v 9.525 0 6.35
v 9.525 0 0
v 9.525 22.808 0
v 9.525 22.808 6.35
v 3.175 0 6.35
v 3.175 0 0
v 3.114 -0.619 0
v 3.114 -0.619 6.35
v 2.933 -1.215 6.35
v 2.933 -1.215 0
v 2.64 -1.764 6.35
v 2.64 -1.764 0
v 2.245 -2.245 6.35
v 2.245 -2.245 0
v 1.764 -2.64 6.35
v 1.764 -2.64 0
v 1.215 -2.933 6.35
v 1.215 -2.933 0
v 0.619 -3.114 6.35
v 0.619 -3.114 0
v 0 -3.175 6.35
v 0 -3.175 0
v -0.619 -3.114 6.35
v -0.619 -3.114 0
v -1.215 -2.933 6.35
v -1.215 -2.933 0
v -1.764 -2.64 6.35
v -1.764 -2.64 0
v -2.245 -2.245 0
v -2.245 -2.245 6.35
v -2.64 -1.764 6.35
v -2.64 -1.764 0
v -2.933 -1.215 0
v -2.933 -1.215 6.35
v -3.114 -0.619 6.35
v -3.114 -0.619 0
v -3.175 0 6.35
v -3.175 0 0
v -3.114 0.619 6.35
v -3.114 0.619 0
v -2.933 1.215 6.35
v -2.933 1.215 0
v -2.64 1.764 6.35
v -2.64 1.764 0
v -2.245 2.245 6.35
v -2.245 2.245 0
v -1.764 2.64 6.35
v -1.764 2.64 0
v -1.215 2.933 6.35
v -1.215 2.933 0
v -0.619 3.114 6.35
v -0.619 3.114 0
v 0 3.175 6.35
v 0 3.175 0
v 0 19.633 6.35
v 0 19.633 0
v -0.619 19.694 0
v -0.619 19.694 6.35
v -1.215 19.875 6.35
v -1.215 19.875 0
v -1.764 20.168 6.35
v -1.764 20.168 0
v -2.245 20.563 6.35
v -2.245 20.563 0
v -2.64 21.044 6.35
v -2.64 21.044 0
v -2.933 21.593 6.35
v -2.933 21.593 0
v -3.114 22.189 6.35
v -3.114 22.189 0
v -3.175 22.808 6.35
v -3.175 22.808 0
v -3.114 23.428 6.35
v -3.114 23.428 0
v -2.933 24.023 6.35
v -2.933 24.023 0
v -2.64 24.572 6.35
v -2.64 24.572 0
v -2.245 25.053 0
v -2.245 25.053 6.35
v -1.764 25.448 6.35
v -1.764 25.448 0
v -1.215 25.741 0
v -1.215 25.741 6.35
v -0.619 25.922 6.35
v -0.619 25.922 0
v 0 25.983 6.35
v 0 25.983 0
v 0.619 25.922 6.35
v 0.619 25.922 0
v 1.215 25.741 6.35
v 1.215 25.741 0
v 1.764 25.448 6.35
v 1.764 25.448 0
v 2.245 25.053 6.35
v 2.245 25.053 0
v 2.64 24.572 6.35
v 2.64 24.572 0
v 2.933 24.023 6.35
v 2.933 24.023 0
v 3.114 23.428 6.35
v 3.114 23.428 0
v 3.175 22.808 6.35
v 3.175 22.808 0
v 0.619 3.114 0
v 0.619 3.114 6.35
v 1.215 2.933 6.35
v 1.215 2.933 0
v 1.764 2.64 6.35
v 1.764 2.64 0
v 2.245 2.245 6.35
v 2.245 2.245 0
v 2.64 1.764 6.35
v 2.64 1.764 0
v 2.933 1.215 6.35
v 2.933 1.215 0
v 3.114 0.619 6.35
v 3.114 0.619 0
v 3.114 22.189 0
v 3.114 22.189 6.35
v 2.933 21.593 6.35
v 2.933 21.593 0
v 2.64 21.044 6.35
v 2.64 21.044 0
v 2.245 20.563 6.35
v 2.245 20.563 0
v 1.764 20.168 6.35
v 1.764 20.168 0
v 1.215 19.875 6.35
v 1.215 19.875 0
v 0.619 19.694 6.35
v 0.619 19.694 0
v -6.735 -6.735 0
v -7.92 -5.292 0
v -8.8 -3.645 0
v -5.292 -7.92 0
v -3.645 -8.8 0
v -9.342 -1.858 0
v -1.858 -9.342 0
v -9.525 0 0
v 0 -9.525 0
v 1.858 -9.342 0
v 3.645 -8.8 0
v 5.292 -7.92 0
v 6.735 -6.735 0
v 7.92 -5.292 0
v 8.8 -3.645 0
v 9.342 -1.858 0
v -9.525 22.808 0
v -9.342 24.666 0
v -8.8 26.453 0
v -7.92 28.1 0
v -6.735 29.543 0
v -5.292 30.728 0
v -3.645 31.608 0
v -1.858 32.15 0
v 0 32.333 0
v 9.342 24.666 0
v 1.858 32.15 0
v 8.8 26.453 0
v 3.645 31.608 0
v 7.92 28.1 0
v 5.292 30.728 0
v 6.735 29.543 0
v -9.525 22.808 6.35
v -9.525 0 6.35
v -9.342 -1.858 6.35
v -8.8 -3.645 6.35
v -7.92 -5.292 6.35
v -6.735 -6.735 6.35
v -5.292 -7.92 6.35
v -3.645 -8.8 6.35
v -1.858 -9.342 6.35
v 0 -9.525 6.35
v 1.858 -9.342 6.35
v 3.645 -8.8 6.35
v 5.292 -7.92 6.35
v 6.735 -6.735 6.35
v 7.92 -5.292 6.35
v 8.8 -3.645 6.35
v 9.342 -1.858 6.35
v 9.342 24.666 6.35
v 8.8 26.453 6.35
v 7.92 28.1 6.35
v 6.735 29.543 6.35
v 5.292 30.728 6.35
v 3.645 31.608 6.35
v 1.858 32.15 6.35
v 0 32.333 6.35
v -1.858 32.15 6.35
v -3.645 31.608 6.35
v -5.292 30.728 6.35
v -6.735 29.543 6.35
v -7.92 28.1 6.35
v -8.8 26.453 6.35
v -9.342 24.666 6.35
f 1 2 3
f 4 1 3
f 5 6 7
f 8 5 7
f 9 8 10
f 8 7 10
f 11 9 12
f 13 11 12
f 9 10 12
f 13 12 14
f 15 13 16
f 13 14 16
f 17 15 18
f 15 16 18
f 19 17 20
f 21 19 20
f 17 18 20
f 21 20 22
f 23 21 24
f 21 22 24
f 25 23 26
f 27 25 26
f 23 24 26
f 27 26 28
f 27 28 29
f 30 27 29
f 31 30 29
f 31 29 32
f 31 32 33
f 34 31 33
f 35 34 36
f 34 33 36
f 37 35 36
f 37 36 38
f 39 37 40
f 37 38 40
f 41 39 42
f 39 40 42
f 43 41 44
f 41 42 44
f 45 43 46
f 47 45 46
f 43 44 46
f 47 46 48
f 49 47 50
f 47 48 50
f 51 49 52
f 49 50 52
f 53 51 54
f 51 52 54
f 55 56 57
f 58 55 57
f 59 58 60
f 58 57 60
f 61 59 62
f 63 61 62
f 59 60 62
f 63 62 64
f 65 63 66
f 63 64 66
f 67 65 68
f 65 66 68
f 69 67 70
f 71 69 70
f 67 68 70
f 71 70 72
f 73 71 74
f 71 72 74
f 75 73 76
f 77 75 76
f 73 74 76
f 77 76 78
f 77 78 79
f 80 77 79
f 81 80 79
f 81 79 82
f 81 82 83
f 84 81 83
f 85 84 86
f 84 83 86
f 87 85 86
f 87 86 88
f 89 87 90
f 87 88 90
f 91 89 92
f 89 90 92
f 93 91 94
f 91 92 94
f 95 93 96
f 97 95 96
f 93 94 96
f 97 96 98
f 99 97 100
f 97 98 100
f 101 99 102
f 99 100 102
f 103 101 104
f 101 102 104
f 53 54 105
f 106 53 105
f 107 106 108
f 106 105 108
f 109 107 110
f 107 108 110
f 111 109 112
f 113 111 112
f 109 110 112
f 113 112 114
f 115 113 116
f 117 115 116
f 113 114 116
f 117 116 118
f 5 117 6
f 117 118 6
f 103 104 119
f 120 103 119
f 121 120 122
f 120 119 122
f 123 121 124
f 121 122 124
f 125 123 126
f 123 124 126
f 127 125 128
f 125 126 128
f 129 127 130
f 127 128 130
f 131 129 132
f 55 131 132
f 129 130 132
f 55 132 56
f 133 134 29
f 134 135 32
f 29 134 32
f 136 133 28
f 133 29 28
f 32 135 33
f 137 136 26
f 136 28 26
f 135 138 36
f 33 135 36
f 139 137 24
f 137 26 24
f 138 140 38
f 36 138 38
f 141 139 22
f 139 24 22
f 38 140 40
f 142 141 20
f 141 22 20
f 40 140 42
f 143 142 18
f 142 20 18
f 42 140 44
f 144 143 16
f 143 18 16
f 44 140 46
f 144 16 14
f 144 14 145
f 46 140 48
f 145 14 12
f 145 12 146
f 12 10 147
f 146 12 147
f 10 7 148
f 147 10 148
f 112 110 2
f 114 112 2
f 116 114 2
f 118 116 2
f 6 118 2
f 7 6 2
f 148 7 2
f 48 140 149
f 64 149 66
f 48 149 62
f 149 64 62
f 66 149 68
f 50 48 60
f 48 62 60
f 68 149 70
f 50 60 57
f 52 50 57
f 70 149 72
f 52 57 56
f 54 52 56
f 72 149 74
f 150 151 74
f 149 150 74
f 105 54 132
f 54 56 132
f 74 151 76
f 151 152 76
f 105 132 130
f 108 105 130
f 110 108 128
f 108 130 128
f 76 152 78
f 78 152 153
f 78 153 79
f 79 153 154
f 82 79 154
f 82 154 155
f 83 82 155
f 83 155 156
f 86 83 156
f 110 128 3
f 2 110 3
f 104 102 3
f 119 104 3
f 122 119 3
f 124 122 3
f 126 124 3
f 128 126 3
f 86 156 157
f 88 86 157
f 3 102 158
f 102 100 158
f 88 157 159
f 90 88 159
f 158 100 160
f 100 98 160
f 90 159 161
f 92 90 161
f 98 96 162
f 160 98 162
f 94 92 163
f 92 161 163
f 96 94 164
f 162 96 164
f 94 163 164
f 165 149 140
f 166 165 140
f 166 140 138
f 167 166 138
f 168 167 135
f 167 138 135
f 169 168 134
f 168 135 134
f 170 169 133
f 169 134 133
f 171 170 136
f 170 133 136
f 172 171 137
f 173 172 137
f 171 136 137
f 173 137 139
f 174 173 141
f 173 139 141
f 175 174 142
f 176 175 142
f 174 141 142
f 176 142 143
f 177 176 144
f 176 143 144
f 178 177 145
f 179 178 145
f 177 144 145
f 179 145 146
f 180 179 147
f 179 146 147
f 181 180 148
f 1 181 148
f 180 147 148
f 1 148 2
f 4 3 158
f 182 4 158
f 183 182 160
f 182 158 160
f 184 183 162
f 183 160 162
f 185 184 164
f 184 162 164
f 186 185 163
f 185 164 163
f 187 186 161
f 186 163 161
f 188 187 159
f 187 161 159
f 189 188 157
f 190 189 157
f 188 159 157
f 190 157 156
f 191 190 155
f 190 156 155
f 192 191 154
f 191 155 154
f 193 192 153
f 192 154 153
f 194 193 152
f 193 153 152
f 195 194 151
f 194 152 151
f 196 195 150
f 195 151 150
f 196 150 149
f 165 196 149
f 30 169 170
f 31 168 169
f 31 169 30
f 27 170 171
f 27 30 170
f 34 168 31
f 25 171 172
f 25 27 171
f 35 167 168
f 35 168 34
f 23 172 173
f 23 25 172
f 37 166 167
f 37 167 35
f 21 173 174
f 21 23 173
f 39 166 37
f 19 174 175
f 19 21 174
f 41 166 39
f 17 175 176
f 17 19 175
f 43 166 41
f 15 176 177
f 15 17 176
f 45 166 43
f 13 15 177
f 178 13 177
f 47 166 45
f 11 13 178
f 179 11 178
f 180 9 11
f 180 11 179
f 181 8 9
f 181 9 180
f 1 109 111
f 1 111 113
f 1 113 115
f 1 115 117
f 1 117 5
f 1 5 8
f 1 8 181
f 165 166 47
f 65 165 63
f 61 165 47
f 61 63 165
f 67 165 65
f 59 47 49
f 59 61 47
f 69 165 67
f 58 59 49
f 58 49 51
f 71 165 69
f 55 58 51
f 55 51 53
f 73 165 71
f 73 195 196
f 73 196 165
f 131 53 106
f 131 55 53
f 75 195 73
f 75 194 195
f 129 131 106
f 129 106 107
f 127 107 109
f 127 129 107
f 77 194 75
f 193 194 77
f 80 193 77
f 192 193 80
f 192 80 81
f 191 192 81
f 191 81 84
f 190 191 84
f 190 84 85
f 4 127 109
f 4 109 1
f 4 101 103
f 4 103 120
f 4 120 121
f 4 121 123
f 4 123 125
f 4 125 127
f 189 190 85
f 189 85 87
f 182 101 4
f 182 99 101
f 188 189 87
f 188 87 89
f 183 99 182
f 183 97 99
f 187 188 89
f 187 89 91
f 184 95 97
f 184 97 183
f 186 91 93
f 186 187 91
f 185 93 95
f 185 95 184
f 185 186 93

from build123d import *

# Parameters (mm, degrees)
F1_DEPTH = 6.35


with BuildPart() as f1:
    # F0 (on Top) → F1 (new body)
    with BuildSketch(Plane.XY):
        with BuildLine():
            ThreePointArc((9.525, 0), (6.7351920908, 6.7351920908), (0, 9.525))
            ThreePointArc((0, 9.525), (-6.7351920908, 6.7351920908), (-9.525, 0))
            ThreePointArc((-9.525, 0), (0, -9.525), (9.525, 0))
        make_face()
        with BuildLine():
            ThreePointArc((3.175, 0), (-2.2450640303, -2.2450640303), (0, 3.175))
            ThreePointArc((0, 3.175), (2.2450640303, 2.2450640303), (3.175, 0))
        make_face(mode=Mode.SUBTRACT)
        with BuildLine():
            ThreePointArc((-9.525, 0), (-6.7351920908, 6.7351920908), (0, 9.525))
            Line((0, 9.525), (0, 13.2831632736))
            ThreePointArc((0, 13.2831632736), (-6.7351920908, 16.0729711828), (-9.525, 22.8081632736))
            Line((-9.525, 22.8081632736), (-9.525, 0))
        make_face()
        with BuildLine():
            Line((0, 13.2831632736), (0, 9.525))
            ThreePointArc((0, 9.525), (6.7351920908, 6.7351920908), (9.525, 0))
            Line((9.525, 0), (9.525, 22.8081632736))
            ThreePointArc((9.525, 22.8081632736), (6.7351920908, 16.0729711828), (0, 13.2831632736))
        make_face()
        with BuildLine():
            ThreePointArc((-9.525, 22.8081632736), (-6.7351920908, 16.0729711828), (0, 13.2831632736))
            ThreePointArc((0, 13.2831632736), (6.7351920908, 16.0729711828), (9.525, 22.8081632736))
            ThreePointArc((9.525, 22.8081632736), (0, 32.3331632736), (-9.525, 22.8081632736))
        make_face()
        with BuildLine():
            ThreePointArc((3.175, 22.8081632736), (2.2450640303, 20.5630992433), (0, 19.6331632736))
            ThreePointArc((0, 19.6331632736), (-2.2450640303, 25.0532273039), (3.175, 22.8081632736))
        make_face(mode=Mode.SUBTRACT)
    extrude(amount=F1_DEPTH)


solid = f1.part
